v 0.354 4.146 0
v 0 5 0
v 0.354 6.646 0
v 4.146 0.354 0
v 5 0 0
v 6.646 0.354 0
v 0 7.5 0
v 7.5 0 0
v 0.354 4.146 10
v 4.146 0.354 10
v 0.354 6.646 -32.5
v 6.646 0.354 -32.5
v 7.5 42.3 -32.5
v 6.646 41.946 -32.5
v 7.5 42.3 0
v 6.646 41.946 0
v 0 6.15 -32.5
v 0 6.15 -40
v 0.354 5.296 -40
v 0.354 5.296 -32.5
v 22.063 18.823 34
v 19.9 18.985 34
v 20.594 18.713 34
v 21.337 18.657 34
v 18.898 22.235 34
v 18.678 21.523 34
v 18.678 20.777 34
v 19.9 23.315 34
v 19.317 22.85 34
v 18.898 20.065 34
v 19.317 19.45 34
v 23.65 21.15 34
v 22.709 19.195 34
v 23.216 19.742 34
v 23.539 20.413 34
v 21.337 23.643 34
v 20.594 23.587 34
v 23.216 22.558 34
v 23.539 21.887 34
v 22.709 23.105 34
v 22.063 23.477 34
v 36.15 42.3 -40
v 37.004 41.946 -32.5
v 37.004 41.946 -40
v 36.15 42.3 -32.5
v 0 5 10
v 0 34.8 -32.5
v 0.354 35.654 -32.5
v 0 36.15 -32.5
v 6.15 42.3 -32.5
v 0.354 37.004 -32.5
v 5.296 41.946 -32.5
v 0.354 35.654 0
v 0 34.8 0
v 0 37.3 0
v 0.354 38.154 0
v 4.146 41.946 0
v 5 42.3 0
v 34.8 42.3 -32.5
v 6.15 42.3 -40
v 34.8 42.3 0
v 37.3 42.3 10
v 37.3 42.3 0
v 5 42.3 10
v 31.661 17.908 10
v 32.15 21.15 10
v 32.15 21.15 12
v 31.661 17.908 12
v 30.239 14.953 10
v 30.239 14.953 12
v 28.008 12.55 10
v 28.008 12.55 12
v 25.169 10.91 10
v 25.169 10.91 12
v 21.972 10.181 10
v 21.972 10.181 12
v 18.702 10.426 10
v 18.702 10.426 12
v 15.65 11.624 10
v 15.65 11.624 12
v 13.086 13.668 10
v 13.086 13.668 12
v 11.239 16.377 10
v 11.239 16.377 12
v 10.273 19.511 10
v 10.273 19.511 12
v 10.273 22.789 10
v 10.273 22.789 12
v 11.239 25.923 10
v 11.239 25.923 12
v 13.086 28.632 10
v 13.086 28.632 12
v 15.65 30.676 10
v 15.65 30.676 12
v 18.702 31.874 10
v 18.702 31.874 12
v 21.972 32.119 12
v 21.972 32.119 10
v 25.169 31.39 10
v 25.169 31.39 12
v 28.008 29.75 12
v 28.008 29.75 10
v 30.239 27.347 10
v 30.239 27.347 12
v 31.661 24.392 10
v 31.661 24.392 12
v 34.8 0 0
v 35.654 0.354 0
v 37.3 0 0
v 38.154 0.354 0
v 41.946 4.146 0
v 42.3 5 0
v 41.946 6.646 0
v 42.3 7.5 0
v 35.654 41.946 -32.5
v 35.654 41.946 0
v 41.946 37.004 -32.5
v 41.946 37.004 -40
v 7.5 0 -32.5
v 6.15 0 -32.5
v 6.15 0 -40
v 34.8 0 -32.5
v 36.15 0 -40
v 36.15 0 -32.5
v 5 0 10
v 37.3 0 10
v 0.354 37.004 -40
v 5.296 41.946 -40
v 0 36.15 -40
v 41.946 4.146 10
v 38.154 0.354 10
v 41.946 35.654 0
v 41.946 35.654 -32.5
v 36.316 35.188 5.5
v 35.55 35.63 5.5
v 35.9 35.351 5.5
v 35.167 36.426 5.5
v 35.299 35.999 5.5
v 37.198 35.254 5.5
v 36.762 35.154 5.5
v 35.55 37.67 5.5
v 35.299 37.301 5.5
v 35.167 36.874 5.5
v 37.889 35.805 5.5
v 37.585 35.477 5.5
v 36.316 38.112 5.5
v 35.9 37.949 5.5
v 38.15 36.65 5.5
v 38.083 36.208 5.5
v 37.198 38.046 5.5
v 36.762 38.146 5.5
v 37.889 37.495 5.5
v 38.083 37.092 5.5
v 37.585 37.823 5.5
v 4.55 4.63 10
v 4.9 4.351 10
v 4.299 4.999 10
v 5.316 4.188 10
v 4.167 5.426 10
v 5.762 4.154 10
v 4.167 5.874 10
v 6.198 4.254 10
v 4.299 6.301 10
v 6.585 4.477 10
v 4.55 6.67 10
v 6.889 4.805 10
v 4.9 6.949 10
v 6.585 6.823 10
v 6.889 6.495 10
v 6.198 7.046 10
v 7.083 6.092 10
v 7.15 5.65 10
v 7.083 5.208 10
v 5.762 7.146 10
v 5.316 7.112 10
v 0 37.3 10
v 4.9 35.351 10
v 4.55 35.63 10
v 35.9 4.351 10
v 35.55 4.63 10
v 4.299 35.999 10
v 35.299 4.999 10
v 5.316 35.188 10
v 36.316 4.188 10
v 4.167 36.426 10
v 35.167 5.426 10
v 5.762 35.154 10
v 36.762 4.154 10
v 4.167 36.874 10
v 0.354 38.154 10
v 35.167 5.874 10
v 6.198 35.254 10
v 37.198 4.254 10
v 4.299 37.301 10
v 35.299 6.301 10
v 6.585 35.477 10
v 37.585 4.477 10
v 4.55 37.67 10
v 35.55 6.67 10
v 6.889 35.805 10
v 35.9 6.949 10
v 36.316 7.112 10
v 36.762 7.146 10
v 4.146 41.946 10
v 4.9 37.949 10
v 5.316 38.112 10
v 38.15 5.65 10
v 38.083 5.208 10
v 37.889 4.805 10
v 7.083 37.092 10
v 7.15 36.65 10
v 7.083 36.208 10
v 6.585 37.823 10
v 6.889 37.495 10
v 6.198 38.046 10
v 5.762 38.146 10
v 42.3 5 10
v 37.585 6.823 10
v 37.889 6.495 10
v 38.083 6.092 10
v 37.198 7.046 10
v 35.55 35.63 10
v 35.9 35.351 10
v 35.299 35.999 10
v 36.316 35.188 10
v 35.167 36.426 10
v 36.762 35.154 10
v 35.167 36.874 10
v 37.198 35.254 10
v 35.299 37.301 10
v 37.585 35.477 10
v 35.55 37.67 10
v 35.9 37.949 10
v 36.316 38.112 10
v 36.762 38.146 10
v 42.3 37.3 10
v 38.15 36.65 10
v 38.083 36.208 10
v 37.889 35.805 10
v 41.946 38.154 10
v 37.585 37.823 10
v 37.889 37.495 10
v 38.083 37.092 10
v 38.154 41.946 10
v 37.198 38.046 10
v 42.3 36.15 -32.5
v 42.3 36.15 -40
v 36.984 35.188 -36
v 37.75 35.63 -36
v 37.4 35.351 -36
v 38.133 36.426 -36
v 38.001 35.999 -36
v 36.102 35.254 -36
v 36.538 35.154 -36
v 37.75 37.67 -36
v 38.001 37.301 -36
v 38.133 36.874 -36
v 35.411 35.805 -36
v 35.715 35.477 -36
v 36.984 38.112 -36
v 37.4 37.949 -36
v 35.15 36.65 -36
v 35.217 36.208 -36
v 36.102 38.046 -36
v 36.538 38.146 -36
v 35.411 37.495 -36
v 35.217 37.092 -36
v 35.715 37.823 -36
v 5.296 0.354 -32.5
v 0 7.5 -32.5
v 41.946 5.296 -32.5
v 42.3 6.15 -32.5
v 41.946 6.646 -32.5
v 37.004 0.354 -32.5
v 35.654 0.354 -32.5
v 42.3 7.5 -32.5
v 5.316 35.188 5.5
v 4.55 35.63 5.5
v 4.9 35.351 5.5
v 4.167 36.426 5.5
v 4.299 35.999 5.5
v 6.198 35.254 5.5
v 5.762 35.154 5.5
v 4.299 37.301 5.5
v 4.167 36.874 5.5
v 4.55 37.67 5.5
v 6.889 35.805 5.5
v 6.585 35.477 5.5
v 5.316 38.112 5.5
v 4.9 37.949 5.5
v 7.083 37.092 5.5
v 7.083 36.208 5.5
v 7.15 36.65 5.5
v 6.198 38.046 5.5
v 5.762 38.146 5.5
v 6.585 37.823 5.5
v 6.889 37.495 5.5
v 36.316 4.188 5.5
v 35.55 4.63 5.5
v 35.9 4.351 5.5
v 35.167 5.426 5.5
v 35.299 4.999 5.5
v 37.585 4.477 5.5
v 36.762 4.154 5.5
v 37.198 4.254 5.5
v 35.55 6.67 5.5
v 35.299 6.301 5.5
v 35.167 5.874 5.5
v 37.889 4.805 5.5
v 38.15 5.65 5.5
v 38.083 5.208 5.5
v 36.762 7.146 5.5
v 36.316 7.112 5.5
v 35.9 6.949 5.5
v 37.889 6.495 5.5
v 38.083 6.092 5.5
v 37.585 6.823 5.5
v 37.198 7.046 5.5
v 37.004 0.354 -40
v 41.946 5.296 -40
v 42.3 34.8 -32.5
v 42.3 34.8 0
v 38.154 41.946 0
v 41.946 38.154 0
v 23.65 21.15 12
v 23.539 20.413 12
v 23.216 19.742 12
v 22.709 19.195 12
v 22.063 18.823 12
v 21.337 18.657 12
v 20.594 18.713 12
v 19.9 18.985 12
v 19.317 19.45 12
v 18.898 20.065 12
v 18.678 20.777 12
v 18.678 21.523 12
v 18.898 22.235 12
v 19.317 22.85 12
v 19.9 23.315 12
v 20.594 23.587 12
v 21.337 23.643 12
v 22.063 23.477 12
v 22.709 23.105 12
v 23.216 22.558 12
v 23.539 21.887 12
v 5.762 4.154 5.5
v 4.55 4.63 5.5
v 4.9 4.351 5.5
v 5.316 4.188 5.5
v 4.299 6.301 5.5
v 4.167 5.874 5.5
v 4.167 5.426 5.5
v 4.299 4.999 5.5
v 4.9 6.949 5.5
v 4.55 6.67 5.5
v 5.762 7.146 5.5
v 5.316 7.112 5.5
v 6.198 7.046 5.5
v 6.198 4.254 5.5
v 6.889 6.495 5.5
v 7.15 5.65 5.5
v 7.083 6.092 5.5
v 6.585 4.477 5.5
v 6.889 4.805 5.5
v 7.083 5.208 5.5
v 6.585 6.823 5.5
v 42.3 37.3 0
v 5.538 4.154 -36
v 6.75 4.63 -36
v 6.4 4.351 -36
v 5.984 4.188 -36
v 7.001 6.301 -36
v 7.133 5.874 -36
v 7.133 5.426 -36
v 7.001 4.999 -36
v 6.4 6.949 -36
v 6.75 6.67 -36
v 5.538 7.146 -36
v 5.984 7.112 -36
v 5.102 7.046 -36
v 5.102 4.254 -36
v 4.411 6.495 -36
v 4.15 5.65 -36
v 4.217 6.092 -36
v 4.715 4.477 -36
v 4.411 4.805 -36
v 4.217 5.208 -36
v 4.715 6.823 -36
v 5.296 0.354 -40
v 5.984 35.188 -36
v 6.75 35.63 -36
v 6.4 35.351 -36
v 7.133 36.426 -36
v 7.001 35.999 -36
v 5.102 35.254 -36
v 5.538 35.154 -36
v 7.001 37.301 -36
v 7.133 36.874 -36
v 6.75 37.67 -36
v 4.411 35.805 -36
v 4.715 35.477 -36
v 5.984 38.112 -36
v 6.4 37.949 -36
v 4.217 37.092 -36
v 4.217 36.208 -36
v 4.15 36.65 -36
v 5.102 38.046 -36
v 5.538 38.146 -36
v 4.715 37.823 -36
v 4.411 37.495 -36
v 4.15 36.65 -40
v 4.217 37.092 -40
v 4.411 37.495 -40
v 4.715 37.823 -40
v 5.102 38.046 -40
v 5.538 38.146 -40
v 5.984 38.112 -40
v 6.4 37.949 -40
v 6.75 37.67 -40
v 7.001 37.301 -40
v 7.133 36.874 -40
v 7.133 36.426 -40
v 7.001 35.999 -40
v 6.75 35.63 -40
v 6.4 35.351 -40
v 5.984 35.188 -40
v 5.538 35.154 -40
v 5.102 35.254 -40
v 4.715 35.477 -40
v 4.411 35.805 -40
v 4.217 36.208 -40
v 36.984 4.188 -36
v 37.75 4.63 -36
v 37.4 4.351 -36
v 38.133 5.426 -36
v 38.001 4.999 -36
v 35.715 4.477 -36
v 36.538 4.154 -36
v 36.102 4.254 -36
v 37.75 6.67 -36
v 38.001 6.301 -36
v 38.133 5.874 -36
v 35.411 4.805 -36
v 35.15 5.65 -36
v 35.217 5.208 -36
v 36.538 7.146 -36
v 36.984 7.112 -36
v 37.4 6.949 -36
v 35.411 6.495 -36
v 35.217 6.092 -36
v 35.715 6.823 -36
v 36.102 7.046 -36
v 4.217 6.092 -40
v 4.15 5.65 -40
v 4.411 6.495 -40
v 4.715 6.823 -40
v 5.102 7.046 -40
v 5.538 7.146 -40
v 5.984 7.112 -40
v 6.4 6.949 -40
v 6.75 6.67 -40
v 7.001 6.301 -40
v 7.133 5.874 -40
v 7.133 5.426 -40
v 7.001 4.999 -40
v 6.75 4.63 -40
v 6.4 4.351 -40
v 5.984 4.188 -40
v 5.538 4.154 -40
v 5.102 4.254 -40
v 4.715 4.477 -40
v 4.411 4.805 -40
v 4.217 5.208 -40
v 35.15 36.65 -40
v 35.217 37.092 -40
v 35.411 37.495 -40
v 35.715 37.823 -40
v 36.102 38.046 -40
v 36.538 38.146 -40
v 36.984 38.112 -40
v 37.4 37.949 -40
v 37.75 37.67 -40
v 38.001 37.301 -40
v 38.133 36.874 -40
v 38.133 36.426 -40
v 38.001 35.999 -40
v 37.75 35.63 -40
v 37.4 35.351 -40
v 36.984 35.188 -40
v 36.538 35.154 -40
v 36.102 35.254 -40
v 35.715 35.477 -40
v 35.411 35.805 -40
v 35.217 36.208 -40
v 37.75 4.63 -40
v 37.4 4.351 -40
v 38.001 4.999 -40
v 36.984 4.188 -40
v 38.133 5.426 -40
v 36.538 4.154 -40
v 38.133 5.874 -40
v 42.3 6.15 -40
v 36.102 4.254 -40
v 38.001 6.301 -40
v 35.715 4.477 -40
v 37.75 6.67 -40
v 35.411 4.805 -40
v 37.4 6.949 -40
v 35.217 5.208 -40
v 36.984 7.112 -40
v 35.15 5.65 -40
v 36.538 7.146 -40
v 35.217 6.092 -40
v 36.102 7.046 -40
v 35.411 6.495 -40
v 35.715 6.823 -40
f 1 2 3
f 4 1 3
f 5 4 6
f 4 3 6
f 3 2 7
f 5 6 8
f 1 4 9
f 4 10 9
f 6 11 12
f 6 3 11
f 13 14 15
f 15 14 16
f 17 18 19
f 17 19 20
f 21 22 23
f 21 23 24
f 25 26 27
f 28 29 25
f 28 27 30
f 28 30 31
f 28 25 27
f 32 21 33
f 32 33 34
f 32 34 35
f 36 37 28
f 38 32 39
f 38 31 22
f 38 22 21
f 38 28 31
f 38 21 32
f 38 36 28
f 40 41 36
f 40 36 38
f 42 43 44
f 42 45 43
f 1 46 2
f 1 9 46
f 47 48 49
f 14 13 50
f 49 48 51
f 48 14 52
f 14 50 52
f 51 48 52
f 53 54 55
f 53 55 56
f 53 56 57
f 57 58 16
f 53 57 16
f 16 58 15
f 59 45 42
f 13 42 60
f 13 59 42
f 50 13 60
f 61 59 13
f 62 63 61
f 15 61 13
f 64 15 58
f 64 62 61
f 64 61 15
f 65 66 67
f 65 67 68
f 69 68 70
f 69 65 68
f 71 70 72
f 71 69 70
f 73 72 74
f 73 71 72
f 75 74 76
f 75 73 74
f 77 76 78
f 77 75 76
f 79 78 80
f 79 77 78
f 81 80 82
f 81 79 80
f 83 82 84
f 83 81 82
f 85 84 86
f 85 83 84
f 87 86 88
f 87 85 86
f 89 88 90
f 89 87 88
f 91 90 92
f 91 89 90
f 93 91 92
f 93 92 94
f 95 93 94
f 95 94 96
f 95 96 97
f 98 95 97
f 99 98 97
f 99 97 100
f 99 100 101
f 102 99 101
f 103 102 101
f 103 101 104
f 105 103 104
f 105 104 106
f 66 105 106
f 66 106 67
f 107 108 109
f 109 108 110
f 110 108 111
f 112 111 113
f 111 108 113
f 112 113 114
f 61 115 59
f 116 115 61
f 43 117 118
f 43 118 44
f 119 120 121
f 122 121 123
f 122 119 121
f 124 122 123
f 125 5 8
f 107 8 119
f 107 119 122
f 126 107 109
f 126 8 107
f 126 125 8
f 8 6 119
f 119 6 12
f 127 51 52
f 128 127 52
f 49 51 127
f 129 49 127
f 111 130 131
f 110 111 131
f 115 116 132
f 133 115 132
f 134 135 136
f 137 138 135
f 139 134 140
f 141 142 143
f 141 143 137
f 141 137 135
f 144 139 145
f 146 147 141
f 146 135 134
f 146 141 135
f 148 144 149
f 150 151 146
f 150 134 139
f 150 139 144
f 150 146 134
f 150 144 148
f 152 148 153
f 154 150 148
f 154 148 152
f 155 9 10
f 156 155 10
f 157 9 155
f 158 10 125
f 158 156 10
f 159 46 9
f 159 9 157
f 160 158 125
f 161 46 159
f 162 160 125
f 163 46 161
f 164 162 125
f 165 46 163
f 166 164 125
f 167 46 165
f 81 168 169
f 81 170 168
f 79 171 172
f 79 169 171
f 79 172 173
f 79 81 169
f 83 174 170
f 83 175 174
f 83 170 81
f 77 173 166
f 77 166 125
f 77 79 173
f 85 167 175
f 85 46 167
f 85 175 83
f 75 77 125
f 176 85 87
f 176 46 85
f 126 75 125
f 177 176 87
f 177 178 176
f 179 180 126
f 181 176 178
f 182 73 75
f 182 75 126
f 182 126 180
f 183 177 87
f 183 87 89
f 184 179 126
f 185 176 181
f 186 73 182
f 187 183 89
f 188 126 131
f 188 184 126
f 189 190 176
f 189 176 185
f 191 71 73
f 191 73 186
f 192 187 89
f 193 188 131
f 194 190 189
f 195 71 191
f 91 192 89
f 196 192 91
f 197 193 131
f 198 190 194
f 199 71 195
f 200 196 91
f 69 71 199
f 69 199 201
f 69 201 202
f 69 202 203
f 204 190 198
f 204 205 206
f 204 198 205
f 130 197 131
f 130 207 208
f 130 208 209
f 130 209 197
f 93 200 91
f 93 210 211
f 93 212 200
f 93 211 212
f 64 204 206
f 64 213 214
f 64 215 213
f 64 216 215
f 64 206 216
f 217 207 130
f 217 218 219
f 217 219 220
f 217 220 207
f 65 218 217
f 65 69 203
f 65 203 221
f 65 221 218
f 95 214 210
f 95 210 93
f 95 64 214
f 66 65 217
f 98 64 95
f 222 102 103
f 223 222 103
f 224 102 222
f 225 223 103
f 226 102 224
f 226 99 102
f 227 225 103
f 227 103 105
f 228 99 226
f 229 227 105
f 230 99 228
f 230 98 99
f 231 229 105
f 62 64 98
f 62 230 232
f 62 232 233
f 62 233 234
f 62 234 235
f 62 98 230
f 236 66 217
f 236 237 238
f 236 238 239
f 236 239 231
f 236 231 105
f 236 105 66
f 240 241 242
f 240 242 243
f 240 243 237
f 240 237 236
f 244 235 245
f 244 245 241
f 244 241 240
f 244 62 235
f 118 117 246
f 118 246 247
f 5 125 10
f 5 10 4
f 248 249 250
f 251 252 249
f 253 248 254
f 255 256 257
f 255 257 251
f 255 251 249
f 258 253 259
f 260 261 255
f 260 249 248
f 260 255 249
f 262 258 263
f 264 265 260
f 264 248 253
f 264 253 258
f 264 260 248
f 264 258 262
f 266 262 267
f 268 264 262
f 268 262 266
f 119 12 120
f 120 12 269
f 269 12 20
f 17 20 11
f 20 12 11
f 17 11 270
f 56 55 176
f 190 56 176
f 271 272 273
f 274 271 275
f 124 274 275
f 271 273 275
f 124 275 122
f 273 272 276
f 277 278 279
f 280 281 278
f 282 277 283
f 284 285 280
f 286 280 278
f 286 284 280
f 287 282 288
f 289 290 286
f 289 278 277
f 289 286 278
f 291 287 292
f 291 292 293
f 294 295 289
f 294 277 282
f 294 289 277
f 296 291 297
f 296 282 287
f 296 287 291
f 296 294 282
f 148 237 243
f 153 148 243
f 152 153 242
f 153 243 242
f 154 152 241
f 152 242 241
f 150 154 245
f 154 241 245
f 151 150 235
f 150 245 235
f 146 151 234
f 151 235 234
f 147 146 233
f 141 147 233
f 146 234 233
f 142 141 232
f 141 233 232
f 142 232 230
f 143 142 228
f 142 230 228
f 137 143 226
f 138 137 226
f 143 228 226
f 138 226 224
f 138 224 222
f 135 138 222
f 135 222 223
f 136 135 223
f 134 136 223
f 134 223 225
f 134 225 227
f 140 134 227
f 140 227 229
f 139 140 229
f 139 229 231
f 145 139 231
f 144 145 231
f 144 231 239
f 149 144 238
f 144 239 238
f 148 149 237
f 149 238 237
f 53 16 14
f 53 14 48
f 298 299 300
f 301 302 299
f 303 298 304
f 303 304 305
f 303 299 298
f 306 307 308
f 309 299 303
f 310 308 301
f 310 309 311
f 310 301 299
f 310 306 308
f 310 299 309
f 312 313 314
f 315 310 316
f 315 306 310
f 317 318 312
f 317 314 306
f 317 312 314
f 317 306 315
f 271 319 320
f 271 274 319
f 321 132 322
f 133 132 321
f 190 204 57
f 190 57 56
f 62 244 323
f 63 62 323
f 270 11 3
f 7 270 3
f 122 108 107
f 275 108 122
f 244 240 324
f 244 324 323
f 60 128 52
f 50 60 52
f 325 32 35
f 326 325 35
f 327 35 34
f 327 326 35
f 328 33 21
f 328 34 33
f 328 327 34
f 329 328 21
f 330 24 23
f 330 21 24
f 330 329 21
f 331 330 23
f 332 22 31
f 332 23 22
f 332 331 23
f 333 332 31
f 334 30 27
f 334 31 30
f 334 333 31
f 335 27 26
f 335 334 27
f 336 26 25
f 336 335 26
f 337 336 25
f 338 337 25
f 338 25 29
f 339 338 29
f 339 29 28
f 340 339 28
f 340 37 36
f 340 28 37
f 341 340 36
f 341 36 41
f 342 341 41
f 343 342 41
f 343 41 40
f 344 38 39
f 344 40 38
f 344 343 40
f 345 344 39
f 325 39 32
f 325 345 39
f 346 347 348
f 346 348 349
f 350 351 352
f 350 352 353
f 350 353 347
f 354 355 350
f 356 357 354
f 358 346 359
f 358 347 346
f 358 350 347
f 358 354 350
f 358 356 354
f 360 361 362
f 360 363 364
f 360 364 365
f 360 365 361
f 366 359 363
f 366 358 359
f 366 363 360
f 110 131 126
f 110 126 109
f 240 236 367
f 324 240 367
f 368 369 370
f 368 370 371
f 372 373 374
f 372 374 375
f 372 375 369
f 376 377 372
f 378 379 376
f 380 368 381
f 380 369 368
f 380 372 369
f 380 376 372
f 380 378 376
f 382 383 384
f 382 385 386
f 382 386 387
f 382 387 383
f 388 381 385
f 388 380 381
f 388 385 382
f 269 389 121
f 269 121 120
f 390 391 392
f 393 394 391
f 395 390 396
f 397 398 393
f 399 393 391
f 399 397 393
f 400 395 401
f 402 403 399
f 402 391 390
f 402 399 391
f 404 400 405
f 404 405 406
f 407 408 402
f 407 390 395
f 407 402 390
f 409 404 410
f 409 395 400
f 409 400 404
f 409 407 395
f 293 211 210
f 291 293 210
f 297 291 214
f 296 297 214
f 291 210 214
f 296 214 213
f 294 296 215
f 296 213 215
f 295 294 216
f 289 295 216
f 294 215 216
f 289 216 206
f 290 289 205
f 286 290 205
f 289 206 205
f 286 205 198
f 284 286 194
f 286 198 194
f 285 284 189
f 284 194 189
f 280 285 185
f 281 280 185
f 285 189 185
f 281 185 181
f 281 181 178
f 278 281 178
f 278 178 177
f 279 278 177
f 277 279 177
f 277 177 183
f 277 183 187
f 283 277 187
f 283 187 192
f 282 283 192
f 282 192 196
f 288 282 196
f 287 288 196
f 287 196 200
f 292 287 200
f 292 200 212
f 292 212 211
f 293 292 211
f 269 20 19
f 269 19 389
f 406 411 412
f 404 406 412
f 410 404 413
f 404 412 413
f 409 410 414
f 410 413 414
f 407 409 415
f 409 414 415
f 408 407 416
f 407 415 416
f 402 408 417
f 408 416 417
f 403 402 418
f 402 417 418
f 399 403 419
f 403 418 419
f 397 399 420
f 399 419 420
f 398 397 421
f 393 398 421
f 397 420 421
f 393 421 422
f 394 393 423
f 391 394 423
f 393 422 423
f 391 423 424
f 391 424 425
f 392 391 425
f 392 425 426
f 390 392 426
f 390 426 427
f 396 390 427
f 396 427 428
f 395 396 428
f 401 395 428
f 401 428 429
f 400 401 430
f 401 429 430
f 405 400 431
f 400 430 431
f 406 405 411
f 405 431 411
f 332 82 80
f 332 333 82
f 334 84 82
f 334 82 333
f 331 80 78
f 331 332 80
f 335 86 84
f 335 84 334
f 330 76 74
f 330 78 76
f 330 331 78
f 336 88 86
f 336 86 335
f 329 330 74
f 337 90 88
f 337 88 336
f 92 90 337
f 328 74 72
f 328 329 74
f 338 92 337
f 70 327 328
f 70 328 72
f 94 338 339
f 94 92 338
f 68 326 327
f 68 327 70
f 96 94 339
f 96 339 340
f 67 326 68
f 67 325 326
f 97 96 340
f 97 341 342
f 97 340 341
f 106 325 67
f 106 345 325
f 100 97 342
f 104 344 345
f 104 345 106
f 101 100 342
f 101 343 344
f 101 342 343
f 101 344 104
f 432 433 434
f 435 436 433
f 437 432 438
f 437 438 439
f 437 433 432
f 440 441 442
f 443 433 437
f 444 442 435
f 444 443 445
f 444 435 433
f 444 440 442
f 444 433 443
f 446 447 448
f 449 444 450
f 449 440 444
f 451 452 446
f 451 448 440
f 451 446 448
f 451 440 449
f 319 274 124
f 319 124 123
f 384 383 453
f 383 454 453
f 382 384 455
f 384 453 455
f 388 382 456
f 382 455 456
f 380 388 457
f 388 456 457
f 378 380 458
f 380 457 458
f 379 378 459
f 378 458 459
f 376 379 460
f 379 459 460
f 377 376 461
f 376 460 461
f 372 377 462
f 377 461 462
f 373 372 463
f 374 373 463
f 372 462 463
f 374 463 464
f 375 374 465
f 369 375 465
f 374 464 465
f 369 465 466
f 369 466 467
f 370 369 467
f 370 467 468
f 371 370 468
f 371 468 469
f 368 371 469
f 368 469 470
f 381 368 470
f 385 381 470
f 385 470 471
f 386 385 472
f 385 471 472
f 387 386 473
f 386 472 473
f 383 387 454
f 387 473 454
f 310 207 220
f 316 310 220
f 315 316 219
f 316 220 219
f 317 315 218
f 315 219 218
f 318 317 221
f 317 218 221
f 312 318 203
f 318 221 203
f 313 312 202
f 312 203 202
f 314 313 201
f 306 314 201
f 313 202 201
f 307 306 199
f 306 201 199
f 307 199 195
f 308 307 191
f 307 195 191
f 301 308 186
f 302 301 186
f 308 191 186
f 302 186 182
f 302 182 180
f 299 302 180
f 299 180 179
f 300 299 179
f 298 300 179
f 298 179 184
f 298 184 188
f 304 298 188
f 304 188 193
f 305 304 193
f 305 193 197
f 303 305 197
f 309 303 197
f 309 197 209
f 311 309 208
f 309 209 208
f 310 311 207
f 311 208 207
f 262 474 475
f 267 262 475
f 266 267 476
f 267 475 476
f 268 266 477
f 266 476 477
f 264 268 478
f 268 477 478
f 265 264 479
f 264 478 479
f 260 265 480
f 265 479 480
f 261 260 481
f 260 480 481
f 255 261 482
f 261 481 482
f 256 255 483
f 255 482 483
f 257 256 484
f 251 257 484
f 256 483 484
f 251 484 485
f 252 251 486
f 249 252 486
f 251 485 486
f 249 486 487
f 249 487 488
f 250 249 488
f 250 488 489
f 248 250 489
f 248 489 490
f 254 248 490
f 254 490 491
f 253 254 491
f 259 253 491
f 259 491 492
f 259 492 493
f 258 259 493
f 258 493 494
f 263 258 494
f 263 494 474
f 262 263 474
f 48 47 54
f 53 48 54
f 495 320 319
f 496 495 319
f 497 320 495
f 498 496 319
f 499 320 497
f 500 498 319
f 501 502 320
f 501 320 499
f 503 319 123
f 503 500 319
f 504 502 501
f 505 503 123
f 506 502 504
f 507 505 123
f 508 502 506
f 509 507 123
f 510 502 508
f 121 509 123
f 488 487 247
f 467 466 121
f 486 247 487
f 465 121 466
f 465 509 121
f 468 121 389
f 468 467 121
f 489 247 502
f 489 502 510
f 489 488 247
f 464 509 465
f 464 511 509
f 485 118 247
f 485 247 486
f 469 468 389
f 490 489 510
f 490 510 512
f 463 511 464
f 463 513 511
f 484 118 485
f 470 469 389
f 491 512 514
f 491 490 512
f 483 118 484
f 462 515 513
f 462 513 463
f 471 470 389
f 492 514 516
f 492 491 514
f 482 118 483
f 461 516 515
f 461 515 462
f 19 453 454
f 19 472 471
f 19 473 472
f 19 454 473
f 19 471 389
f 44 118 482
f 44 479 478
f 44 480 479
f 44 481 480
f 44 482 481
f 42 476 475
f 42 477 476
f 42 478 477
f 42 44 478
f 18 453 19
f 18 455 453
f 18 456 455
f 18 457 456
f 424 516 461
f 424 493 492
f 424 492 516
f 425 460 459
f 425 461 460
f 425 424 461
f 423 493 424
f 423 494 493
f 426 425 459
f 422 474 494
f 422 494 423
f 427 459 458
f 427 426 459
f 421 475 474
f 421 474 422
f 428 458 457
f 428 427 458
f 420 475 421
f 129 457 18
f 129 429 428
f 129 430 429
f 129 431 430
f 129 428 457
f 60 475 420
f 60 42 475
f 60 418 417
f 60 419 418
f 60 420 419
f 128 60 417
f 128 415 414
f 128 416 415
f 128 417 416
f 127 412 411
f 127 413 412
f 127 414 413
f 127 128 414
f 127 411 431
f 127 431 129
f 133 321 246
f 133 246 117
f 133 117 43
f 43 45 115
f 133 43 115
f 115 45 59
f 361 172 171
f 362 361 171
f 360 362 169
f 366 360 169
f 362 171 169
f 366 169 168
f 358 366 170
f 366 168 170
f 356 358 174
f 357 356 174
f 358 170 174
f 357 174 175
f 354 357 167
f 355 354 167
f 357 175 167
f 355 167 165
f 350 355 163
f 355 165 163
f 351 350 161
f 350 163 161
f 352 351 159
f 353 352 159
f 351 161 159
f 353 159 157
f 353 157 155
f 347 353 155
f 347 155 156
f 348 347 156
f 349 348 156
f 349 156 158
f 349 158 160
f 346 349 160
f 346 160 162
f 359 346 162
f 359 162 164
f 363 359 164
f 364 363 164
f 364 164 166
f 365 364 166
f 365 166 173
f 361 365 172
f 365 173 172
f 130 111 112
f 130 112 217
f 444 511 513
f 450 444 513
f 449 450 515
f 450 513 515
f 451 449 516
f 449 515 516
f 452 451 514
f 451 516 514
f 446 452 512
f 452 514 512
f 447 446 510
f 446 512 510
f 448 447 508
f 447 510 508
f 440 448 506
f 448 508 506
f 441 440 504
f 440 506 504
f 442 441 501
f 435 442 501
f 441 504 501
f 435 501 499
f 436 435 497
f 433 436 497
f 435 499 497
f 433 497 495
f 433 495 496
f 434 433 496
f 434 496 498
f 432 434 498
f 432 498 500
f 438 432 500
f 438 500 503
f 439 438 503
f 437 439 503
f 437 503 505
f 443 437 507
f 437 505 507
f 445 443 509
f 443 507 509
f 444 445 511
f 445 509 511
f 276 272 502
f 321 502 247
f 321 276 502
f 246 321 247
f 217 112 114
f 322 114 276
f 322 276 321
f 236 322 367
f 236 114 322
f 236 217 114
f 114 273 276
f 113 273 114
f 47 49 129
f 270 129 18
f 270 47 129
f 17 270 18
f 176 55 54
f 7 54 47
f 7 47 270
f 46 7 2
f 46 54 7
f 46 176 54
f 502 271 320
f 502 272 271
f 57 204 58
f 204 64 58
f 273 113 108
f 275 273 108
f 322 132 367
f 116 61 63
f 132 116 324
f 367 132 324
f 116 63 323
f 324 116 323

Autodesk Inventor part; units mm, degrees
ref_plane "YZ Plane" through (0, 0, 0) normal (1, 0, 0) x (0, 1, 0)
ref_plane "XZ Plane" through (0, 0, 0) normal (0, 1, 0) x (-1, 0, 0)
ref_plane "XY Plane" through (0, 0, 0) normal (0, 0, 1) x (1, 0, 0)
sketch "Эскиз1" plane through (0, 0, 0) normal (0, 0, 1) x (1, 0, 0)
  line L0 (0, 0) -> (42.3, 0)
  line L1 (42.3, 0) -> (42.3, 42.3)
  line L2 (42.3, 42.3) -> (0, 42.3)
  line L3 (0, 42.3) -> (0, 0)
  dimension "d0" = 42.3
  dimension "d1" = 42.3
extrude "Выдавливание1" add sketch "Эскиз1" along normal blind 10
sketch "Эскиз2" plane through (0, 0, 10) normal (0, 0, 1) x (1, 0, 0)
  circle A0 centre (5.65, 5.65) radius 1.5
  circle A1 centre (5.65, 36.65) radius 1.5
  line L0 (0, 0) -> (42.3, 0) projected
  line L1 (42.3, 0) -> (42.3, 42.3) projected
  line L2 (36.65, 5.65) -> (36.65, 36.65)
  circle A2 centre (36.65, 36.65) radius 1.5
  circle A3 centre (36.65, 5.65) radius 1.5
  point P0 (0, 42.3)
  dimension "d6" = 3
  dimension "d7" = 3
  dimension "d12" = 31
  dimension "d13" = 3
  dimension "d14" = 3
extrude "Выдавливание2" cut sketch "Эскиз2" against normal blind 4.5
thread "Резьба1" size "M3x0.5" class "6H" standard "ANSI Metric M Profile" full length
thread "Резьба2" size "M3x0.5" class "6H" standard "ANSI Metric M Profile" full length
thread "Резьба3" size "M3x0.5" class "6H" standard "ANSI Metric M Profile" full length
thread "Резьба4" size "M3x0.5" class "6H" standard "ANSI Metric M Profile" full length
sketch "Эскиз3" plane through (0, 0, 10) normal (0, 0, 1) x (1, 0, 0)
  line L0 (0, 42.3) -> (0, 0) projected
  line L1 (0, 42.3) -> (0, 37.8)
  line L2 (0, 0) -> (42.3, 0) projected
  line L3 (0, 0) -> (0, 4.5)
  line L4 (0, 0) -> (4.5, 0)
  line L5 (4.5, 0) -> (0, 4.5)
  line L6 (42.3, 42.3) -> (0, 42.3) projected
  line L7 (0, 42.3) -> (4.5, 42.3)
  line L8 (4.5, 42.3) -> (0, 37.8)
  line L9 (42.3, 42.3) -> (37.8, 42.3)
  line L10 (42.3, 0) -> (42.3, 42.3) projected
  line L11 (42.3, 42.3) -> (42.3, 37.8)
  line L12 (42.3, 37.8) -> (37.8, 42.3)
  line L13 (42.3, 0) -> (37.8, 0)
  line L14 (42.3, 0) -> (42.3, 4.5)
  line L15 (42.3, 4.5) -> (37.8, 0)
  dimension "d27" = 4.5
  dimension "d28" = 4.5
  dimension "d29" = 4.5
  dimension "d30" = 4.5
  dimension "d31" = 4.5
  dimension "d32" = 4.5
extrude "Выдавливание3" cut sketch "Эскиз3" against normal blind 10 contours L6 L8 L0 | L5 L2 L0 | L6 L10 L12 | L15 L10 L2
chamfer "Фаска1" distance 0.5 angle 45 1 edges at (4.5, 42.3, 5)
chamfer "Фаска2" distance 0.5 angle 45 7 edges at (0, 37.8, 5) (37.8, 42.3, 5) (42.3, 37.8, 5) (42.3, 4.5, 5) (37.8, 0, 5) (4.5, 0, 5) (0, 4.5, 5)
sketch "Эскиз5" plane through (0, 0, 0) normal (0, 0, -1) x (-1, 0, 0)
  line L0 (0, 0) -> (-42.3, 0)
  line L1 (-42.3, 0) -> (-42.3, 42.3)
  line L2 (-42.3, 42.3) -> (0, 42.3)
  line L3 (0, 42.3) -> (0, 0)
  line L4 (-42.3, 42.3) -> (-42.3, 35.3)
  line L5 (-42.3, 5) -> (-42.3, 37.3) projected
  line L6 (-42.3, 42.3) -> (-35.3, 42.3)
  line L7 (-37.3, 42.3) -> (-5, 42.3) projected
  line L8 (-35.3, 42.3) -> (-42.3, 35.3)
  line L9 (-42.3, 0) -> (-35.3, 0)
  line L10 (-42.3, 0) -> (-42.3, 7)
  line L11 (-42.3, 7) -> (-35.3, 0)
  line L12 (0, 0) -> (-7, 0)
  line L13 (-5, 0) -> (-37.3, 0) projected
  line L14 (0, 0) -> (0, 7)
  line L15 (0, 7) -> (-7, 0)
  line L16 (0, 42.3) -> (-7, 42.3)
  line L17 (-7, 42.3) -> (0, 35.3)
  line L18 (0, 37.3) -> (0, 5) projected
  dimension "d41" = 42.3
  dimension "d42" = 42.3
  dimension "d43" = 7
  dimension "d44" = 7
  dimension "d45" = 7
  dimension "d46" = 7
  dimension "d47" = 7
  dimension "d48" = 7
  dimension "d49" = 7
extrude "Выдавливание4" add sketch "Эскиз5" along normal blind 32.5 contours L0 L11 L1 L8 L2 L17 L3 L15
chamfer "Фаска3" distance 0.5 angle 45 8 edges at (0, 35.3, -16.25) (7, 42.3, -16.25) (0, 7, -16.25) (7, 0, -16.25) (42.3, 35.3, -16.25) (35.3, 42.3, -16.25) (42.3, 7, -16.25) (35.3, 0, -16.25)
sketch "Эскиз10" plane through (0, 0, -32.5) normal (0, 0, -1) x (-1, 0, 0)
  line L0 (0, 0) -> (-42.3, 0)
  line L1 (-42.3, 0) -> (-42.3, 42.3)
  line L2 (-42.3, 42.3) -> (0, 42.3)
  line L3 (0, 42.3) -> (0, 0)
  line L4 (-42.3, 42.3) -> (-36.65, 42.3)
  line L5 (-42.3, 42.3) -> (-42.3, 36.65)
  line L6 (-42.3, 36.65) -> (-36.65, 42.3)
  line L7 (0, 42.3) -> (-5.65, 42.3)
  line L8 (0, 42.3) -> (0, 36.65)
  line L9 (0, 36.65) -> (-5.65, 42.3)
  line L10 (-37.3, 42.3) -> (-5, 42.3) projected
  line L11 (0, 0) -> (-5.65, 0)
  line L12 (0, 0) -> (0, 5.65)
  line L13 (0, 7.5) -> (0, 5) projected
  line L14 (0, 5.65) -> (-5.65, 0)
  line L15 (-42.3, 0) -> (-42.3, 5.65)
  line L16 (-42.3, 0) -> (-36.65, 0)
  line L17 (-35.6536, 0.3536) -> (-41.9464, 6.6464) projected
  line L18 (-36.65, 0) -> (-42.3, 5.65)
  dimension "d57" = 42.3
  dimension "d58" = 42.3
  dimension "d59" = 5.65
  dimension "d60" = 5.65
  dimension "d61" = 5.65
  dimension "d62" = 5.65
  dimension "d63" = 5.65
  dimension "d64" = 5.65
  dimension "d65" = 5.65
  dimension "d66" = 5.65
extrude "Выдавливание5" add sketch "Эскиз10" along normal blind 7.5 contours L0 L18 L1 L6 L2 L9 L3 L14
chamfer "Фаска4" distance 0.5 angle 45 8 edges at (0, 36.65, -36.25) (5.65, 42.3, -36.25) (0, 5.65, -36.25) (5.65, 0, -36.25) (36.65, 0, -36.25) (42.3, 5.65, -36.25) (36.65, 42.3, -36.25) (42.3, 36.65, -36.25)
sketch "Эскиз11" plane through (0, 0, -40) normal (0, 0, -1) x (-1, 0, 0)
  circle A0 centre (-5.65, 5.65) radius 1.5 projected
  circle A1 centre (-5.65, 5.65) radius 1.5
  circle A2 centre (-36.65, 5.65) radius 1.5 projected
  circle A3 centre (-36.65, 5.65) radius 1.5
  circle A4 centre (-36.65, 36.65) radius 1.5 projected
  circle A5 centre (-36.65, 36.65) radius 1.5
  circle A6 centre (-5.65, 36.65) radius 1.5 projected
  circle A7 centre (-5.65, 36.65) radius 1.5
  point P0 (0, 0)
extrude "Выдавливание6" cut sketch "Эскиз11" against normal blind 4
thread "Резьба5" size "M3x0.5" class "6H" standard "ANSI Metric M Profile" full length
thread "Резьба6" size "M3x0.5" class "6H" standard "ANSI Metric M Profile" full length
thread "Резьба7" size "M3x0.5" class "6H" standard "ANSI Metric M Profile" full length
thread "Резьба8" size "M3x0.5" class "6H" standard "ANSI Metric M Profile" full length
sketch "Эскиз12" plane through (0, 0, 10) normal (0, 0, 1) x (1, 0, 0)
  line L0 (0, 0) -> (42.3, 0)
  line L1 (42.3, 0) -> (42.3, 42.3)
  line L2 (42.3, 42.3) -> (0, 42.3)
  line L3 (0, 42.3) -> (0, 0)
  line L4 (0, 42.3) -> (42.3, 0)
  line L5 (0, 0) -> (42.3, 42.3)
  circle A0 centre (21.15, 21.15) radius 11
  dimension "d82" = 42.3
  dimension "d83" = 42.3
  dimension "d84" = 22
extrude "Выдавливание7" add sketch "Эскиз12" along normal blind 2 contours A0 L4 L5 | L5 L4 A0 | L4 L5 A0 | A0 L5 L4
sketch "Эскиз13" plane through (21.15, 21.15, 12) normal (0, 0, 1) x (1, 0, 0)
  circle A0 centre (0, 0) radius 2.5
  point P0 (-21.15, -21.15)
  dimension "d87" = 5
extrude "Выдавливание8" add sketch "Эскиз13" along normal blind 22
properties part number "Nema17"
